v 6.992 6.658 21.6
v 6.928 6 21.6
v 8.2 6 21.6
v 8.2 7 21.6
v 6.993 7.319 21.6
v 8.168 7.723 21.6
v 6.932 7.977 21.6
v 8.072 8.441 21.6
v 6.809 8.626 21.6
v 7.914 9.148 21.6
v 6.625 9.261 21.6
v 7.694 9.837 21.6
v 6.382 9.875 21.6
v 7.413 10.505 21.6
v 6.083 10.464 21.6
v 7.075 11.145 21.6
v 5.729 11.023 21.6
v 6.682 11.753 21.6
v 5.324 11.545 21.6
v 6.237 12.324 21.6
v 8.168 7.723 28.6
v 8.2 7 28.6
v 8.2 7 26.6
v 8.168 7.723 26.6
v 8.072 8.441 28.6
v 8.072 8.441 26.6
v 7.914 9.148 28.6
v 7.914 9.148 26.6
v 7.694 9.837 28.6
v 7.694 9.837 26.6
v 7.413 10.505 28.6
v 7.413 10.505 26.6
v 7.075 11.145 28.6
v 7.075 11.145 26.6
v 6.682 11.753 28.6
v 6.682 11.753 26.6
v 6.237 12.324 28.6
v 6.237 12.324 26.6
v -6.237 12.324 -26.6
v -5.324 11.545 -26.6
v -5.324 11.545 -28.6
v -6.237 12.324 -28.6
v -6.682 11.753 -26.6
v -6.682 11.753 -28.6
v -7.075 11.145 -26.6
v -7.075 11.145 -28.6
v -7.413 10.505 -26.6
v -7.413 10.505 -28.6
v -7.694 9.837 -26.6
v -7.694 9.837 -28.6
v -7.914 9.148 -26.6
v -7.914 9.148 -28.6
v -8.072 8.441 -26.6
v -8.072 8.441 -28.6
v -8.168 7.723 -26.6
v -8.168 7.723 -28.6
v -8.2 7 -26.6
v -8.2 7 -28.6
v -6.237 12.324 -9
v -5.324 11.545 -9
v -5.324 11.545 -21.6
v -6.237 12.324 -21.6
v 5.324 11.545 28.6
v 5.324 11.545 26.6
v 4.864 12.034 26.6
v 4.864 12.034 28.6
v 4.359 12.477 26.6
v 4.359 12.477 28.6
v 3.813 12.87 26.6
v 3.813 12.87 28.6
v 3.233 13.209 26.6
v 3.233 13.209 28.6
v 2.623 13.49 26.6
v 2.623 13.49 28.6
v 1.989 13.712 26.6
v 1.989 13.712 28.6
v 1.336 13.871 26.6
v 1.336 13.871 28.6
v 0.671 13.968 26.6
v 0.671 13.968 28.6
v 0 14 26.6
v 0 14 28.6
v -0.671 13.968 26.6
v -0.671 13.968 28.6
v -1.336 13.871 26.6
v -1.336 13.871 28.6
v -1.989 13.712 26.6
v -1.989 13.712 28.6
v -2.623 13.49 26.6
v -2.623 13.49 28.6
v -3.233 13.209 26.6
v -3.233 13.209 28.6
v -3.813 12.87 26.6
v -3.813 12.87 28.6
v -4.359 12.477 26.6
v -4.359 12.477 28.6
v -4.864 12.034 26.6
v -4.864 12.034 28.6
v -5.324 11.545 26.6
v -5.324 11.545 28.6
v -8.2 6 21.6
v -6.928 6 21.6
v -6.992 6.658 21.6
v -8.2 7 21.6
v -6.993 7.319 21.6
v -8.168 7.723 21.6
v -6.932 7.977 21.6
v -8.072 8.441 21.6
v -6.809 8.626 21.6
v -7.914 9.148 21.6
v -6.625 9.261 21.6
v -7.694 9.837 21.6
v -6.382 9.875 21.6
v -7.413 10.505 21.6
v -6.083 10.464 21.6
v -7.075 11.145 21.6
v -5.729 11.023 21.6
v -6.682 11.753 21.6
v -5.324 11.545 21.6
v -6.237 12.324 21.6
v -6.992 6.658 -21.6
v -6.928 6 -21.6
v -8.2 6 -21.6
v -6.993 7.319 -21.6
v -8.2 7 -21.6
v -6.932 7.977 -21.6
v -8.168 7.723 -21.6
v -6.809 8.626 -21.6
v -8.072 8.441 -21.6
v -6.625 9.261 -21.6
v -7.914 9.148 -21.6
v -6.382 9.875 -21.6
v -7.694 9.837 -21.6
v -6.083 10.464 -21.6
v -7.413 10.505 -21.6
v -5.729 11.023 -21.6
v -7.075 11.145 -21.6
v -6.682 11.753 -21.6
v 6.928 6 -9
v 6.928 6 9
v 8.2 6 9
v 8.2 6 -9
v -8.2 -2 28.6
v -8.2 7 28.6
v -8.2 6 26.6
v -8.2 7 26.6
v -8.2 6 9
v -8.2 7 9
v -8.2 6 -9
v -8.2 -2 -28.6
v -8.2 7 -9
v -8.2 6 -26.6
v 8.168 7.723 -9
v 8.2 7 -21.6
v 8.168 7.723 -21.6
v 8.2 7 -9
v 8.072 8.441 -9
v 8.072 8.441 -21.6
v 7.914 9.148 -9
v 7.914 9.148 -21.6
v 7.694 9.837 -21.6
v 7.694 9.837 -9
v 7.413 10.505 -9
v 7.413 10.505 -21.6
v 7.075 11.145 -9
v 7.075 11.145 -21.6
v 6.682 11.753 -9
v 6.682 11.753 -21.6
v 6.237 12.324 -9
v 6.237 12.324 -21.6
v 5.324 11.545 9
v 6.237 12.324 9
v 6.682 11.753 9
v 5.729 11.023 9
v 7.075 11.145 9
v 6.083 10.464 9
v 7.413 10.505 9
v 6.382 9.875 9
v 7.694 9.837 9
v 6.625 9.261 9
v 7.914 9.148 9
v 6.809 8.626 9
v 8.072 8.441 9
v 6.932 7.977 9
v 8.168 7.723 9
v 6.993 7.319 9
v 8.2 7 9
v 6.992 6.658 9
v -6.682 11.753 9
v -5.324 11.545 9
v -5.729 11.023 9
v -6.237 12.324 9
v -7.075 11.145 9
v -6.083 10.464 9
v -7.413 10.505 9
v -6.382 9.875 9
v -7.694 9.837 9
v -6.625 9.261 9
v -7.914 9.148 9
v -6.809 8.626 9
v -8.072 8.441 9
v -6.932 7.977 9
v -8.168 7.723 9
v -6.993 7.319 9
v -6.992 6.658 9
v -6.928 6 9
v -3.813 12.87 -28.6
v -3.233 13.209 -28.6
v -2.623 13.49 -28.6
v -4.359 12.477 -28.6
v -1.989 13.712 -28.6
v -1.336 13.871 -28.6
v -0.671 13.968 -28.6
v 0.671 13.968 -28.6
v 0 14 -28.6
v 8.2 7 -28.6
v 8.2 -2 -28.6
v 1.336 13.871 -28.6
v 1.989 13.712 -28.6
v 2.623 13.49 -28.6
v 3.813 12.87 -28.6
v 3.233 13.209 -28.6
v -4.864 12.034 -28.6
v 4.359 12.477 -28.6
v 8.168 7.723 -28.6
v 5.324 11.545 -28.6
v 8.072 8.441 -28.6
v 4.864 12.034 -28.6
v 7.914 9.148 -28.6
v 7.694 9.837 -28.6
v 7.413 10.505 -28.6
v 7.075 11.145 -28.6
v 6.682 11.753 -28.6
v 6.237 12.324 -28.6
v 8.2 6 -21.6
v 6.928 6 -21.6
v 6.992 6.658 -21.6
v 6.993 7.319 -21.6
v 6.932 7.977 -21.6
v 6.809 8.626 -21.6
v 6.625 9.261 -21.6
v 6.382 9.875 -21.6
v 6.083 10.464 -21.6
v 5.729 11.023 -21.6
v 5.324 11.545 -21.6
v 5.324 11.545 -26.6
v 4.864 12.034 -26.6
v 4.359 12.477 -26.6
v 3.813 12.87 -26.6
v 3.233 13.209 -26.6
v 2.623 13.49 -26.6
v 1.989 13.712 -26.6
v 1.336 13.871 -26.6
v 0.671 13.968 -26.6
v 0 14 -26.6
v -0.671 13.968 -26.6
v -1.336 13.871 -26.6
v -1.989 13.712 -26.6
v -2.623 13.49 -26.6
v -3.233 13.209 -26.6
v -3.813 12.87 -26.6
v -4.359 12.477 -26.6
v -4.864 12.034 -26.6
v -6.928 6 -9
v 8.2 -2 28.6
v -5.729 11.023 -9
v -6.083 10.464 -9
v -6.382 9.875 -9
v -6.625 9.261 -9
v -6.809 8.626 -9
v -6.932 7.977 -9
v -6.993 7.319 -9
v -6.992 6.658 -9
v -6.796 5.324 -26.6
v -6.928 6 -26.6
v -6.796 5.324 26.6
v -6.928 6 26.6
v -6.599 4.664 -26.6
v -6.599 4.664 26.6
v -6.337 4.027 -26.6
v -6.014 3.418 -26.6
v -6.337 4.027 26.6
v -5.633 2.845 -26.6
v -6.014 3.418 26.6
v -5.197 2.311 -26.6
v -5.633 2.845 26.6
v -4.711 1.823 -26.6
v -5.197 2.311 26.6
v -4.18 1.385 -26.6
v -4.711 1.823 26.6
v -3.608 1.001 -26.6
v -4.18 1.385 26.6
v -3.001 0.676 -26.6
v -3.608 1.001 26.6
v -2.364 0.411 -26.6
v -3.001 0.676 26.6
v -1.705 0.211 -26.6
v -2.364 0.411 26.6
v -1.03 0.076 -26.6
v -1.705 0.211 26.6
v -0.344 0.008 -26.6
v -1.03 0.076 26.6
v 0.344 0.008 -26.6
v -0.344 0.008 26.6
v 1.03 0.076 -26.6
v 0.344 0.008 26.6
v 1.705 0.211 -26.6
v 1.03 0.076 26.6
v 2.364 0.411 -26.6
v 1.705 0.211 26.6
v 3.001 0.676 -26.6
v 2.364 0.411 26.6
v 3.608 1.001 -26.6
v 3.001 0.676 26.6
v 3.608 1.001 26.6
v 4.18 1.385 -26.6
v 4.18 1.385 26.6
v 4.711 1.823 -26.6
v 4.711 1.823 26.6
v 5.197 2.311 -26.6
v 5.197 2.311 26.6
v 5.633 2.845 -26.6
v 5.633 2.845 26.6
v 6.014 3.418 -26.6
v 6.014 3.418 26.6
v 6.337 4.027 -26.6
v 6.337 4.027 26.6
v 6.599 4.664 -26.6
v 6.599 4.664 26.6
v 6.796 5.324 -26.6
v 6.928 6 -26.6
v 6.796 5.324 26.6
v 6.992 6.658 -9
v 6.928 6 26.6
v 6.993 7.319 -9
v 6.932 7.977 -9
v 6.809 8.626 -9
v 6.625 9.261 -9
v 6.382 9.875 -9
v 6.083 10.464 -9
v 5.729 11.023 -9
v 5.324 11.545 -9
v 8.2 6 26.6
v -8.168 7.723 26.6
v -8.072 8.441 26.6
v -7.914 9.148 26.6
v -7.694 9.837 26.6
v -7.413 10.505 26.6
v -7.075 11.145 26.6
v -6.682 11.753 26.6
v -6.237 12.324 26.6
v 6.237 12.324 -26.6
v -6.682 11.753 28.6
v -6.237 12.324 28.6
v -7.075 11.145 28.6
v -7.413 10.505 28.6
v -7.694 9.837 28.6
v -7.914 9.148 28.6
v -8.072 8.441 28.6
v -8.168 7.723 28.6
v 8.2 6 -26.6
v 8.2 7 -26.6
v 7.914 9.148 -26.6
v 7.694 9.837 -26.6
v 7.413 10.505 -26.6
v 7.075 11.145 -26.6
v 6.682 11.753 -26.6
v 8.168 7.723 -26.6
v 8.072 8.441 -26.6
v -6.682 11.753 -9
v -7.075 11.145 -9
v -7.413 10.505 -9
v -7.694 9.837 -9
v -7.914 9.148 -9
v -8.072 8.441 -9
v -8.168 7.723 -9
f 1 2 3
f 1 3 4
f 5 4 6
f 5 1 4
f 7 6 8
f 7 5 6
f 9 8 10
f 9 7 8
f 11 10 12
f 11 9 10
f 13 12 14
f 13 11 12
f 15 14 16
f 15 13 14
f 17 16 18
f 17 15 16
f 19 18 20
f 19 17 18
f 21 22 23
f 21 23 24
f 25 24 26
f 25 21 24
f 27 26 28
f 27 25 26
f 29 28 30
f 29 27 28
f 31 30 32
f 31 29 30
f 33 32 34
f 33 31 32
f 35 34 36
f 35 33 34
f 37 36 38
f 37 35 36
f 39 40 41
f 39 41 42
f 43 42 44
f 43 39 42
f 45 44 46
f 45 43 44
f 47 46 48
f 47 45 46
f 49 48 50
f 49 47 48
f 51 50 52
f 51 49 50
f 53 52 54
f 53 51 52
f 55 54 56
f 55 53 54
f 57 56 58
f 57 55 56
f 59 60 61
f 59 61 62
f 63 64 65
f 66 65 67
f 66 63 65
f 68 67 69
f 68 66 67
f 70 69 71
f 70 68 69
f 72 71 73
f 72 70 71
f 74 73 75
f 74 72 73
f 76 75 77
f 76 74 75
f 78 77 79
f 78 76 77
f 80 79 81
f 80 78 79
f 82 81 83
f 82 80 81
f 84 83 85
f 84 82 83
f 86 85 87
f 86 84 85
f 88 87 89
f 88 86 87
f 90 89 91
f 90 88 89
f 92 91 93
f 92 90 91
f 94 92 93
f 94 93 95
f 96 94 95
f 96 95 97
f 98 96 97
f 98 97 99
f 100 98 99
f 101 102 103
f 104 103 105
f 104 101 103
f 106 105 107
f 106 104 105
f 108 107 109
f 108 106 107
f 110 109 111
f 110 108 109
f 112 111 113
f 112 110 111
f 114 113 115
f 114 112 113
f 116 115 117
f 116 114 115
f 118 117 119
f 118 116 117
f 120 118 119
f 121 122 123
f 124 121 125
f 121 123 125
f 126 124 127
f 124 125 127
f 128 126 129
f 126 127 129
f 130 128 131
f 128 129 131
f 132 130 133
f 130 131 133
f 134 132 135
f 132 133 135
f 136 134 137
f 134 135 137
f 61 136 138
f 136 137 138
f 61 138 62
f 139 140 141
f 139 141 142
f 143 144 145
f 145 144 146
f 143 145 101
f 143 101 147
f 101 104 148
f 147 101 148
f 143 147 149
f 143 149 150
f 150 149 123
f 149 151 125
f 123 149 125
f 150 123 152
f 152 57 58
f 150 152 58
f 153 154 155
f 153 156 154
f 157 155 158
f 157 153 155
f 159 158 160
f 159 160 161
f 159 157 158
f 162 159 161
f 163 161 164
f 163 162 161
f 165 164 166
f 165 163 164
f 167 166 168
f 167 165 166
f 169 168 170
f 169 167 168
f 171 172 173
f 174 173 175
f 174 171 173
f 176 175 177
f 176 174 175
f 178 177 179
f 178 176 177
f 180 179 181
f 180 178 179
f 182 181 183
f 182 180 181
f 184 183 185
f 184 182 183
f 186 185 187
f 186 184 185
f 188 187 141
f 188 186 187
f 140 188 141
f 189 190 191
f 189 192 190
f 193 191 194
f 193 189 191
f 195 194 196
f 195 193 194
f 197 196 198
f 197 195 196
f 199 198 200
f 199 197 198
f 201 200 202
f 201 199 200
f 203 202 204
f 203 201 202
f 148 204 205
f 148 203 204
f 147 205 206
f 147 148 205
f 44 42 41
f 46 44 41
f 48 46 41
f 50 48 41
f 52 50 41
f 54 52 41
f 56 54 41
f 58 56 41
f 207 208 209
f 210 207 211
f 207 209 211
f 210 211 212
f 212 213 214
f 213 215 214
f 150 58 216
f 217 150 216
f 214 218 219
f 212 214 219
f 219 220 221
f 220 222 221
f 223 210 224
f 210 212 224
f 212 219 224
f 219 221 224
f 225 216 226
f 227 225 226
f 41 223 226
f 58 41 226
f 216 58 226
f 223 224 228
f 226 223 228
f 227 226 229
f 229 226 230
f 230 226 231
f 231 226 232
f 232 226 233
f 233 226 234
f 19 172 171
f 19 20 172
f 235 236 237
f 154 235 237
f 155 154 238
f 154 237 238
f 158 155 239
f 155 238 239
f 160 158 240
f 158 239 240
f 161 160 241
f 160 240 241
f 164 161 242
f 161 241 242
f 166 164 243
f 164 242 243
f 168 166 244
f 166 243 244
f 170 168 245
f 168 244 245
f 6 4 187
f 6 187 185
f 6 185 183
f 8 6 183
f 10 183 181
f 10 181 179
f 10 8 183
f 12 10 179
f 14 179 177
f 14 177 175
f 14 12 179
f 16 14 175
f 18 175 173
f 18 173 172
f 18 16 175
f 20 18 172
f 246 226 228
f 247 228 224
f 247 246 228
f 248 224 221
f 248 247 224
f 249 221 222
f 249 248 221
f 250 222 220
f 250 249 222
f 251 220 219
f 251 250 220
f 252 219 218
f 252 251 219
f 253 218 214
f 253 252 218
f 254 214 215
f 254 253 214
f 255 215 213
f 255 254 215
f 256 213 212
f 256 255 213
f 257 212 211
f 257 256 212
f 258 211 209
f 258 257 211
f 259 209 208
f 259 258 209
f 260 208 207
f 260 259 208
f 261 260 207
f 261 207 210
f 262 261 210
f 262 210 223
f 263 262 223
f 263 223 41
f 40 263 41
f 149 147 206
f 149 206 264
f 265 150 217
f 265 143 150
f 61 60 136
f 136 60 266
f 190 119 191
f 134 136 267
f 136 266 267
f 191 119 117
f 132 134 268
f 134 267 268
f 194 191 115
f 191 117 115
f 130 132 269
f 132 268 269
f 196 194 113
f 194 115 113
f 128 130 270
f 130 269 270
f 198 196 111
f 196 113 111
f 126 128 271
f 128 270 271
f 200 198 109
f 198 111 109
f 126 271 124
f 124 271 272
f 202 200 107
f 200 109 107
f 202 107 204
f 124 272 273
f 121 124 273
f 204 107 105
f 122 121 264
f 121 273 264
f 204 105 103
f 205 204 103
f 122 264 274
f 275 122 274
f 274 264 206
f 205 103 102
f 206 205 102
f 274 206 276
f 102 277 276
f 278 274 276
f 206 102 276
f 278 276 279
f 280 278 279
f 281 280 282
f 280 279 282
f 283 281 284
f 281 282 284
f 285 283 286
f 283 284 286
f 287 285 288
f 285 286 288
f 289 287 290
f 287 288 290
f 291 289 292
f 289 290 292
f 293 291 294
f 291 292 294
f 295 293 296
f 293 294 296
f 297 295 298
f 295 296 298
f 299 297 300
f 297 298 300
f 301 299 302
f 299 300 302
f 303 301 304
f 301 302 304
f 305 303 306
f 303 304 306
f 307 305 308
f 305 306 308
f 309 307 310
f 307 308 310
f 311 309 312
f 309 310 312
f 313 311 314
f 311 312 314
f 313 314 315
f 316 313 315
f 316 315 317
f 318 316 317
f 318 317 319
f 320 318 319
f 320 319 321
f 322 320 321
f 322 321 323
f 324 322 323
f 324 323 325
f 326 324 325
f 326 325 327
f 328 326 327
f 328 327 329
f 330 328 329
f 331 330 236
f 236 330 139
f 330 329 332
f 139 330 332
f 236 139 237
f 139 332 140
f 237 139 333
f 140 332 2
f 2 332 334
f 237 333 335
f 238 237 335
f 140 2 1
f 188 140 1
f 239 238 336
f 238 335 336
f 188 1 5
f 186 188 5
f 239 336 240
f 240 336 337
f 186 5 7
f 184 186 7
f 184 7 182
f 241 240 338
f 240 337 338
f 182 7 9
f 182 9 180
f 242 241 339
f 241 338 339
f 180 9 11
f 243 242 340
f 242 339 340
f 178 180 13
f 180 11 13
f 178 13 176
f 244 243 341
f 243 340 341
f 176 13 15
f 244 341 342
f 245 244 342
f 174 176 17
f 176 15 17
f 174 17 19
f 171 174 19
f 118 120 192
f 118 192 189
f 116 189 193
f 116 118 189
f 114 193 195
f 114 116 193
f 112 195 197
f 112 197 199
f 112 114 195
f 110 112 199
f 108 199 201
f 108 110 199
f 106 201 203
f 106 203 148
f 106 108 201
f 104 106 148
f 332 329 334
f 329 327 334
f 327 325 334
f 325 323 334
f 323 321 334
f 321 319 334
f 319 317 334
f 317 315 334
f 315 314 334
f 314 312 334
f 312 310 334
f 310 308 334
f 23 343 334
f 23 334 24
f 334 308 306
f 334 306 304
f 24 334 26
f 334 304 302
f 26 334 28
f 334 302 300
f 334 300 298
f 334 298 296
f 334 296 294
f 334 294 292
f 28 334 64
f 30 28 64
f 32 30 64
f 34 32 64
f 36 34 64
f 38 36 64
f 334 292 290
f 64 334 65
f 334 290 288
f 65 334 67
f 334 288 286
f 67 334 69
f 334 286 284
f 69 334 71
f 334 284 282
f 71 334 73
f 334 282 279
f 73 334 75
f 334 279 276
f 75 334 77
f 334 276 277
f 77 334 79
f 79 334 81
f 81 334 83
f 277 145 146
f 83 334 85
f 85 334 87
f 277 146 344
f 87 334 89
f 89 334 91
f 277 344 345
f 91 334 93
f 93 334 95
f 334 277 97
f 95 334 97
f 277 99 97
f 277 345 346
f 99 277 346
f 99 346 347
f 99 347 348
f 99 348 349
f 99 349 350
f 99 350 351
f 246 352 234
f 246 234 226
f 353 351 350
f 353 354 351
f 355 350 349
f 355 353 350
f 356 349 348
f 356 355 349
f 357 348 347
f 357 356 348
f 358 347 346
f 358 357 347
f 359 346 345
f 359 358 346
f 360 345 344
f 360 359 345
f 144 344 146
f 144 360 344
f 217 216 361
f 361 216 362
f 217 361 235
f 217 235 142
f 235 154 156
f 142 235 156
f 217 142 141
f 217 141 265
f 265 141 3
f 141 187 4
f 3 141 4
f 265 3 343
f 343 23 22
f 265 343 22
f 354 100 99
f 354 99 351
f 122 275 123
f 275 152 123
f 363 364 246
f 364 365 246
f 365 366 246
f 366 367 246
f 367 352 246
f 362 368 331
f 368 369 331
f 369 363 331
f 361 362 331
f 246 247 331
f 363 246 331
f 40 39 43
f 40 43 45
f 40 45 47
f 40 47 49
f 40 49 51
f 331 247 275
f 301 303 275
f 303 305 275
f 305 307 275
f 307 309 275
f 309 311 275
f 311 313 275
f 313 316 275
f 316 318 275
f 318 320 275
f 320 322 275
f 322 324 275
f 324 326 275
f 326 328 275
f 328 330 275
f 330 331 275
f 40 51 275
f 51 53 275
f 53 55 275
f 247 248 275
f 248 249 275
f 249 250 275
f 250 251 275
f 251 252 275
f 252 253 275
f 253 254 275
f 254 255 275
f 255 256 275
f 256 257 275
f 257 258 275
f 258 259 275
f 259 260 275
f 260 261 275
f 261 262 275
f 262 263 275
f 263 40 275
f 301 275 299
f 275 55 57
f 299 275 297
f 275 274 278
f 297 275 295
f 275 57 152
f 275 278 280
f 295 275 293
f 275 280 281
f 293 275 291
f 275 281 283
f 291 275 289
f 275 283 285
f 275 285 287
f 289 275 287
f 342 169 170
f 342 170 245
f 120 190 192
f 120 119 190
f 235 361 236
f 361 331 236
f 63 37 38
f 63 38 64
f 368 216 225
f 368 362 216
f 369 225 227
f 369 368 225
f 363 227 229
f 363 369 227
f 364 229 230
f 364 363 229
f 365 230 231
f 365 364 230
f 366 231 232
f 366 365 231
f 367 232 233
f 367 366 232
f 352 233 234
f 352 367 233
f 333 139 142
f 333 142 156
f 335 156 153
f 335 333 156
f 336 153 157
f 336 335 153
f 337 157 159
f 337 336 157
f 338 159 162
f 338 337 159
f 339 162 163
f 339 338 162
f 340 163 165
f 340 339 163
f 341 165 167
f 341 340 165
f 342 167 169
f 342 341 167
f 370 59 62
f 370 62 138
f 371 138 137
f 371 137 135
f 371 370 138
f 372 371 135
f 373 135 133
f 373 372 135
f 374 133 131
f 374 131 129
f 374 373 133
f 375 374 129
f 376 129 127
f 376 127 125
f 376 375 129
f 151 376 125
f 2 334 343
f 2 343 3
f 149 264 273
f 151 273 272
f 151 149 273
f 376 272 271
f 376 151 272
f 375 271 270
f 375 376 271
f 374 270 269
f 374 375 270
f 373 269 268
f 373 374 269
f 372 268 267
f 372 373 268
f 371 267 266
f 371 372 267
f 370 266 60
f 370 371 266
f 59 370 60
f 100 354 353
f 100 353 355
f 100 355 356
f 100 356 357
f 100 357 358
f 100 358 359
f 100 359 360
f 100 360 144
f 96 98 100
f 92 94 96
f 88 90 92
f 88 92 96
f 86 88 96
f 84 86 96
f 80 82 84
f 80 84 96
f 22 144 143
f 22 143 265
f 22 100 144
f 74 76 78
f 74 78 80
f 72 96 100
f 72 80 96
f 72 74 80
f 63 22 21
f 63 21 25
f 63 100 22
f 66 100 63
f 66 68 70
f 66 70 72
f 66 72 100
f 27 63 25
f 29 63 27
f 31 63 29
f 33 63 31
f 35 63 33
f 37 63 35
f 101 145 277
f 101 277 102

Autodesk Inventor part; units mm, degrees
ref_plane "YZ Plane" through (0, 0, 0) normal (1, 0, 0) x (0, 1, 0)
ref_plane "XZ Plane" through (0, 0, 0) normal (0, 1, 0) x (-1, 0, 0)
ref_plane "XY Plane" through (0, 0, 0) normal (0, 0, 1) x (1, 0, 0)
sketch "スケッチ1" plane through (0, 0, 0) normal (0, 1, 0) x (-1, 0, 0)
  line L0 (8.2, 28.6) -> (-8.2, 28.6)
  line L1 (-8.2, 28.6) -> (-8.2, -28.6)
  line L2 (-8.2, -28.6) -> (8.2, -28.6)
  line L3 (8.2, -28.6) -> (8.2, 28.6)
  line L4 (7, 26.6) -> (-7, 26.6)
  line L5 (-7, 26.6) -> (-7, -26.6)
  line L6 (-7, -26.6) -> (7, -26.6)
  line L7 (7, -26.6) -> (7, 26.6)
  point P0 (0, 0)
  point P1 (8.2, 0)
  point P2 (0, 28.6)
  point P3 (0, 26.6)
  point P4 (7, 0)
  dimension "d0" = 57.2
  dimension "d1" = 16.4
  dimension "d4" = 2
  dimension "d7" = 14
extrude "押し出し1" add sketch "スケッチ1" along normal blind 14
sketch "スケッチ2" plane through (-8.2, 0, 28.6) normal (0, 0, 1) x (1, 0, 0)
  circle A0 centre (8.2, 7) radius 7
  line L0 (0, 14) -> (16.4, 14) projected
  line L1 (0, 0) -> (16.4, 0) projected
  circle A1 centre (8.2, 7) radius 8.2
  line L2 (16.4, 0) -> (16.4, 14) projected
  line L3 (8.2, 7) -> (0, 14)
  line L4 (16.4, 14) -> (8.2, 7)
  line L5 (0, 0) -> (0, 14) projected
  point P0 (8.2, 0)
  point P1 (8.2, 0)
  point P2 (2.876, 11.5448)
  point P3 (1.9634, 12.324)
  point P4 (0, 7)
  point P5 (8.2, 0)
  point P6 (14.4366, 12.324)
  point P7 (13.524, 11.5448)
  point P8 (16.4, 7)
  point P9 (8.2, 14)
  dimension "d8" = 14
extrude "押し出し2" add sketch "スケッチ2" against normal up to surface (57.2 mm away) contours A0 L4 A1 L1 | L1 A1 L3 A0 | L1 L5 A1 | A1 L2 L1
extrude "押し出し3" cut sketch "スケッチ2" against normal through all contours A0 L0 A1 L4 | A0 L3 A1 L0 | L4 L2 A1 | A1 L0 L4 | A1 L3 L0 | A1 L5 L3
sketch "スケッチ3" plane through (0, 0, 0) normal (1, 0, 0) x (0, 1, 0)
  line L0 (0, 26.6) -> (11.5448, 26.6) projected
  line L1 (11.5448, -26.6) -> (11.5448, -26.6) projected
  line L2 (11.5448, -26.6) -> (0, -26.6) projected
  line L3 (0, -26.6) -> (11.5448, -26.6) projected
  line L4 (11.5448, 26.6) -> (11.5448, 26.6) projected
  line L5 (11.5448, 26.6) -> (0, 26.6) projected
  line L6 (0, 26.6) -> (11.5448, 26.6) projected
  line L7 (11.5448, 26.6) -> (14, 26.6) projected
  line L8 (14, -26.6) -> (11.5448, -26.6) projected
  line L9 (-2.8, 0) -> (16.8, 0) projected
  line L10 (14, 9) -> (6, 9)
  line L11 (6, 9) -> (6, -9)
  line L12 (6, -9) -> (14, -9)
  line L13 (14, 26.6) -> (6, 26.6)
  line L14 (6, 26.6) -> (6, 21.6)
  line L15 (6, 21.6) -> (14, 21.6)
  line L16 (14, 21.6) -> (14, 26.6)
  line L17 (14, -26.6) -> (6, -26.6)
  line L18 (6, -26.6) -> (6, -21.6)
  line L19 (6, -21.6) -> (14, -21.6)
  line L20 (14, -21.6) -> (14, -26.6)
  line L21 (14, 9) -> (14, -9)
  line L22 (0, 26.6) -> (0, -26.6) projected
  point P0 (0, 0)
  point P1 (12.7724, -26.6)
  point P2 (14, 0)
  point P3 (0, 0)
  dimension "d13" = 8
  dimension "d14" = 18
  dimension "d15" = 5
extrude "押し出し4" cut sketch "スケッチ3" along normal through all both and the other way through all
sketch "スケッチ4" plane through (0, 0, 0) normal (0, -1, 0) x (1, 0, 0)
  line L0 (-8.2, 28.6) -> (8.2, 28.6) projected
  line L1 (8.2, 28.6) -> (-8.2, 28.6)
  line L2 (-8.2, 28.6) -> (-8.2, -28.6)
  line L3 (-8.2, -28.6) -> (8.2, -28.6)
  line L4 (8.2, -28.6) -> (8.2, 28.6)
  point P0 (0, 0)
extrude "押し出し5" add sketch "スケッチ4" along normal blind 2
properties part number "AA_battery_box"
